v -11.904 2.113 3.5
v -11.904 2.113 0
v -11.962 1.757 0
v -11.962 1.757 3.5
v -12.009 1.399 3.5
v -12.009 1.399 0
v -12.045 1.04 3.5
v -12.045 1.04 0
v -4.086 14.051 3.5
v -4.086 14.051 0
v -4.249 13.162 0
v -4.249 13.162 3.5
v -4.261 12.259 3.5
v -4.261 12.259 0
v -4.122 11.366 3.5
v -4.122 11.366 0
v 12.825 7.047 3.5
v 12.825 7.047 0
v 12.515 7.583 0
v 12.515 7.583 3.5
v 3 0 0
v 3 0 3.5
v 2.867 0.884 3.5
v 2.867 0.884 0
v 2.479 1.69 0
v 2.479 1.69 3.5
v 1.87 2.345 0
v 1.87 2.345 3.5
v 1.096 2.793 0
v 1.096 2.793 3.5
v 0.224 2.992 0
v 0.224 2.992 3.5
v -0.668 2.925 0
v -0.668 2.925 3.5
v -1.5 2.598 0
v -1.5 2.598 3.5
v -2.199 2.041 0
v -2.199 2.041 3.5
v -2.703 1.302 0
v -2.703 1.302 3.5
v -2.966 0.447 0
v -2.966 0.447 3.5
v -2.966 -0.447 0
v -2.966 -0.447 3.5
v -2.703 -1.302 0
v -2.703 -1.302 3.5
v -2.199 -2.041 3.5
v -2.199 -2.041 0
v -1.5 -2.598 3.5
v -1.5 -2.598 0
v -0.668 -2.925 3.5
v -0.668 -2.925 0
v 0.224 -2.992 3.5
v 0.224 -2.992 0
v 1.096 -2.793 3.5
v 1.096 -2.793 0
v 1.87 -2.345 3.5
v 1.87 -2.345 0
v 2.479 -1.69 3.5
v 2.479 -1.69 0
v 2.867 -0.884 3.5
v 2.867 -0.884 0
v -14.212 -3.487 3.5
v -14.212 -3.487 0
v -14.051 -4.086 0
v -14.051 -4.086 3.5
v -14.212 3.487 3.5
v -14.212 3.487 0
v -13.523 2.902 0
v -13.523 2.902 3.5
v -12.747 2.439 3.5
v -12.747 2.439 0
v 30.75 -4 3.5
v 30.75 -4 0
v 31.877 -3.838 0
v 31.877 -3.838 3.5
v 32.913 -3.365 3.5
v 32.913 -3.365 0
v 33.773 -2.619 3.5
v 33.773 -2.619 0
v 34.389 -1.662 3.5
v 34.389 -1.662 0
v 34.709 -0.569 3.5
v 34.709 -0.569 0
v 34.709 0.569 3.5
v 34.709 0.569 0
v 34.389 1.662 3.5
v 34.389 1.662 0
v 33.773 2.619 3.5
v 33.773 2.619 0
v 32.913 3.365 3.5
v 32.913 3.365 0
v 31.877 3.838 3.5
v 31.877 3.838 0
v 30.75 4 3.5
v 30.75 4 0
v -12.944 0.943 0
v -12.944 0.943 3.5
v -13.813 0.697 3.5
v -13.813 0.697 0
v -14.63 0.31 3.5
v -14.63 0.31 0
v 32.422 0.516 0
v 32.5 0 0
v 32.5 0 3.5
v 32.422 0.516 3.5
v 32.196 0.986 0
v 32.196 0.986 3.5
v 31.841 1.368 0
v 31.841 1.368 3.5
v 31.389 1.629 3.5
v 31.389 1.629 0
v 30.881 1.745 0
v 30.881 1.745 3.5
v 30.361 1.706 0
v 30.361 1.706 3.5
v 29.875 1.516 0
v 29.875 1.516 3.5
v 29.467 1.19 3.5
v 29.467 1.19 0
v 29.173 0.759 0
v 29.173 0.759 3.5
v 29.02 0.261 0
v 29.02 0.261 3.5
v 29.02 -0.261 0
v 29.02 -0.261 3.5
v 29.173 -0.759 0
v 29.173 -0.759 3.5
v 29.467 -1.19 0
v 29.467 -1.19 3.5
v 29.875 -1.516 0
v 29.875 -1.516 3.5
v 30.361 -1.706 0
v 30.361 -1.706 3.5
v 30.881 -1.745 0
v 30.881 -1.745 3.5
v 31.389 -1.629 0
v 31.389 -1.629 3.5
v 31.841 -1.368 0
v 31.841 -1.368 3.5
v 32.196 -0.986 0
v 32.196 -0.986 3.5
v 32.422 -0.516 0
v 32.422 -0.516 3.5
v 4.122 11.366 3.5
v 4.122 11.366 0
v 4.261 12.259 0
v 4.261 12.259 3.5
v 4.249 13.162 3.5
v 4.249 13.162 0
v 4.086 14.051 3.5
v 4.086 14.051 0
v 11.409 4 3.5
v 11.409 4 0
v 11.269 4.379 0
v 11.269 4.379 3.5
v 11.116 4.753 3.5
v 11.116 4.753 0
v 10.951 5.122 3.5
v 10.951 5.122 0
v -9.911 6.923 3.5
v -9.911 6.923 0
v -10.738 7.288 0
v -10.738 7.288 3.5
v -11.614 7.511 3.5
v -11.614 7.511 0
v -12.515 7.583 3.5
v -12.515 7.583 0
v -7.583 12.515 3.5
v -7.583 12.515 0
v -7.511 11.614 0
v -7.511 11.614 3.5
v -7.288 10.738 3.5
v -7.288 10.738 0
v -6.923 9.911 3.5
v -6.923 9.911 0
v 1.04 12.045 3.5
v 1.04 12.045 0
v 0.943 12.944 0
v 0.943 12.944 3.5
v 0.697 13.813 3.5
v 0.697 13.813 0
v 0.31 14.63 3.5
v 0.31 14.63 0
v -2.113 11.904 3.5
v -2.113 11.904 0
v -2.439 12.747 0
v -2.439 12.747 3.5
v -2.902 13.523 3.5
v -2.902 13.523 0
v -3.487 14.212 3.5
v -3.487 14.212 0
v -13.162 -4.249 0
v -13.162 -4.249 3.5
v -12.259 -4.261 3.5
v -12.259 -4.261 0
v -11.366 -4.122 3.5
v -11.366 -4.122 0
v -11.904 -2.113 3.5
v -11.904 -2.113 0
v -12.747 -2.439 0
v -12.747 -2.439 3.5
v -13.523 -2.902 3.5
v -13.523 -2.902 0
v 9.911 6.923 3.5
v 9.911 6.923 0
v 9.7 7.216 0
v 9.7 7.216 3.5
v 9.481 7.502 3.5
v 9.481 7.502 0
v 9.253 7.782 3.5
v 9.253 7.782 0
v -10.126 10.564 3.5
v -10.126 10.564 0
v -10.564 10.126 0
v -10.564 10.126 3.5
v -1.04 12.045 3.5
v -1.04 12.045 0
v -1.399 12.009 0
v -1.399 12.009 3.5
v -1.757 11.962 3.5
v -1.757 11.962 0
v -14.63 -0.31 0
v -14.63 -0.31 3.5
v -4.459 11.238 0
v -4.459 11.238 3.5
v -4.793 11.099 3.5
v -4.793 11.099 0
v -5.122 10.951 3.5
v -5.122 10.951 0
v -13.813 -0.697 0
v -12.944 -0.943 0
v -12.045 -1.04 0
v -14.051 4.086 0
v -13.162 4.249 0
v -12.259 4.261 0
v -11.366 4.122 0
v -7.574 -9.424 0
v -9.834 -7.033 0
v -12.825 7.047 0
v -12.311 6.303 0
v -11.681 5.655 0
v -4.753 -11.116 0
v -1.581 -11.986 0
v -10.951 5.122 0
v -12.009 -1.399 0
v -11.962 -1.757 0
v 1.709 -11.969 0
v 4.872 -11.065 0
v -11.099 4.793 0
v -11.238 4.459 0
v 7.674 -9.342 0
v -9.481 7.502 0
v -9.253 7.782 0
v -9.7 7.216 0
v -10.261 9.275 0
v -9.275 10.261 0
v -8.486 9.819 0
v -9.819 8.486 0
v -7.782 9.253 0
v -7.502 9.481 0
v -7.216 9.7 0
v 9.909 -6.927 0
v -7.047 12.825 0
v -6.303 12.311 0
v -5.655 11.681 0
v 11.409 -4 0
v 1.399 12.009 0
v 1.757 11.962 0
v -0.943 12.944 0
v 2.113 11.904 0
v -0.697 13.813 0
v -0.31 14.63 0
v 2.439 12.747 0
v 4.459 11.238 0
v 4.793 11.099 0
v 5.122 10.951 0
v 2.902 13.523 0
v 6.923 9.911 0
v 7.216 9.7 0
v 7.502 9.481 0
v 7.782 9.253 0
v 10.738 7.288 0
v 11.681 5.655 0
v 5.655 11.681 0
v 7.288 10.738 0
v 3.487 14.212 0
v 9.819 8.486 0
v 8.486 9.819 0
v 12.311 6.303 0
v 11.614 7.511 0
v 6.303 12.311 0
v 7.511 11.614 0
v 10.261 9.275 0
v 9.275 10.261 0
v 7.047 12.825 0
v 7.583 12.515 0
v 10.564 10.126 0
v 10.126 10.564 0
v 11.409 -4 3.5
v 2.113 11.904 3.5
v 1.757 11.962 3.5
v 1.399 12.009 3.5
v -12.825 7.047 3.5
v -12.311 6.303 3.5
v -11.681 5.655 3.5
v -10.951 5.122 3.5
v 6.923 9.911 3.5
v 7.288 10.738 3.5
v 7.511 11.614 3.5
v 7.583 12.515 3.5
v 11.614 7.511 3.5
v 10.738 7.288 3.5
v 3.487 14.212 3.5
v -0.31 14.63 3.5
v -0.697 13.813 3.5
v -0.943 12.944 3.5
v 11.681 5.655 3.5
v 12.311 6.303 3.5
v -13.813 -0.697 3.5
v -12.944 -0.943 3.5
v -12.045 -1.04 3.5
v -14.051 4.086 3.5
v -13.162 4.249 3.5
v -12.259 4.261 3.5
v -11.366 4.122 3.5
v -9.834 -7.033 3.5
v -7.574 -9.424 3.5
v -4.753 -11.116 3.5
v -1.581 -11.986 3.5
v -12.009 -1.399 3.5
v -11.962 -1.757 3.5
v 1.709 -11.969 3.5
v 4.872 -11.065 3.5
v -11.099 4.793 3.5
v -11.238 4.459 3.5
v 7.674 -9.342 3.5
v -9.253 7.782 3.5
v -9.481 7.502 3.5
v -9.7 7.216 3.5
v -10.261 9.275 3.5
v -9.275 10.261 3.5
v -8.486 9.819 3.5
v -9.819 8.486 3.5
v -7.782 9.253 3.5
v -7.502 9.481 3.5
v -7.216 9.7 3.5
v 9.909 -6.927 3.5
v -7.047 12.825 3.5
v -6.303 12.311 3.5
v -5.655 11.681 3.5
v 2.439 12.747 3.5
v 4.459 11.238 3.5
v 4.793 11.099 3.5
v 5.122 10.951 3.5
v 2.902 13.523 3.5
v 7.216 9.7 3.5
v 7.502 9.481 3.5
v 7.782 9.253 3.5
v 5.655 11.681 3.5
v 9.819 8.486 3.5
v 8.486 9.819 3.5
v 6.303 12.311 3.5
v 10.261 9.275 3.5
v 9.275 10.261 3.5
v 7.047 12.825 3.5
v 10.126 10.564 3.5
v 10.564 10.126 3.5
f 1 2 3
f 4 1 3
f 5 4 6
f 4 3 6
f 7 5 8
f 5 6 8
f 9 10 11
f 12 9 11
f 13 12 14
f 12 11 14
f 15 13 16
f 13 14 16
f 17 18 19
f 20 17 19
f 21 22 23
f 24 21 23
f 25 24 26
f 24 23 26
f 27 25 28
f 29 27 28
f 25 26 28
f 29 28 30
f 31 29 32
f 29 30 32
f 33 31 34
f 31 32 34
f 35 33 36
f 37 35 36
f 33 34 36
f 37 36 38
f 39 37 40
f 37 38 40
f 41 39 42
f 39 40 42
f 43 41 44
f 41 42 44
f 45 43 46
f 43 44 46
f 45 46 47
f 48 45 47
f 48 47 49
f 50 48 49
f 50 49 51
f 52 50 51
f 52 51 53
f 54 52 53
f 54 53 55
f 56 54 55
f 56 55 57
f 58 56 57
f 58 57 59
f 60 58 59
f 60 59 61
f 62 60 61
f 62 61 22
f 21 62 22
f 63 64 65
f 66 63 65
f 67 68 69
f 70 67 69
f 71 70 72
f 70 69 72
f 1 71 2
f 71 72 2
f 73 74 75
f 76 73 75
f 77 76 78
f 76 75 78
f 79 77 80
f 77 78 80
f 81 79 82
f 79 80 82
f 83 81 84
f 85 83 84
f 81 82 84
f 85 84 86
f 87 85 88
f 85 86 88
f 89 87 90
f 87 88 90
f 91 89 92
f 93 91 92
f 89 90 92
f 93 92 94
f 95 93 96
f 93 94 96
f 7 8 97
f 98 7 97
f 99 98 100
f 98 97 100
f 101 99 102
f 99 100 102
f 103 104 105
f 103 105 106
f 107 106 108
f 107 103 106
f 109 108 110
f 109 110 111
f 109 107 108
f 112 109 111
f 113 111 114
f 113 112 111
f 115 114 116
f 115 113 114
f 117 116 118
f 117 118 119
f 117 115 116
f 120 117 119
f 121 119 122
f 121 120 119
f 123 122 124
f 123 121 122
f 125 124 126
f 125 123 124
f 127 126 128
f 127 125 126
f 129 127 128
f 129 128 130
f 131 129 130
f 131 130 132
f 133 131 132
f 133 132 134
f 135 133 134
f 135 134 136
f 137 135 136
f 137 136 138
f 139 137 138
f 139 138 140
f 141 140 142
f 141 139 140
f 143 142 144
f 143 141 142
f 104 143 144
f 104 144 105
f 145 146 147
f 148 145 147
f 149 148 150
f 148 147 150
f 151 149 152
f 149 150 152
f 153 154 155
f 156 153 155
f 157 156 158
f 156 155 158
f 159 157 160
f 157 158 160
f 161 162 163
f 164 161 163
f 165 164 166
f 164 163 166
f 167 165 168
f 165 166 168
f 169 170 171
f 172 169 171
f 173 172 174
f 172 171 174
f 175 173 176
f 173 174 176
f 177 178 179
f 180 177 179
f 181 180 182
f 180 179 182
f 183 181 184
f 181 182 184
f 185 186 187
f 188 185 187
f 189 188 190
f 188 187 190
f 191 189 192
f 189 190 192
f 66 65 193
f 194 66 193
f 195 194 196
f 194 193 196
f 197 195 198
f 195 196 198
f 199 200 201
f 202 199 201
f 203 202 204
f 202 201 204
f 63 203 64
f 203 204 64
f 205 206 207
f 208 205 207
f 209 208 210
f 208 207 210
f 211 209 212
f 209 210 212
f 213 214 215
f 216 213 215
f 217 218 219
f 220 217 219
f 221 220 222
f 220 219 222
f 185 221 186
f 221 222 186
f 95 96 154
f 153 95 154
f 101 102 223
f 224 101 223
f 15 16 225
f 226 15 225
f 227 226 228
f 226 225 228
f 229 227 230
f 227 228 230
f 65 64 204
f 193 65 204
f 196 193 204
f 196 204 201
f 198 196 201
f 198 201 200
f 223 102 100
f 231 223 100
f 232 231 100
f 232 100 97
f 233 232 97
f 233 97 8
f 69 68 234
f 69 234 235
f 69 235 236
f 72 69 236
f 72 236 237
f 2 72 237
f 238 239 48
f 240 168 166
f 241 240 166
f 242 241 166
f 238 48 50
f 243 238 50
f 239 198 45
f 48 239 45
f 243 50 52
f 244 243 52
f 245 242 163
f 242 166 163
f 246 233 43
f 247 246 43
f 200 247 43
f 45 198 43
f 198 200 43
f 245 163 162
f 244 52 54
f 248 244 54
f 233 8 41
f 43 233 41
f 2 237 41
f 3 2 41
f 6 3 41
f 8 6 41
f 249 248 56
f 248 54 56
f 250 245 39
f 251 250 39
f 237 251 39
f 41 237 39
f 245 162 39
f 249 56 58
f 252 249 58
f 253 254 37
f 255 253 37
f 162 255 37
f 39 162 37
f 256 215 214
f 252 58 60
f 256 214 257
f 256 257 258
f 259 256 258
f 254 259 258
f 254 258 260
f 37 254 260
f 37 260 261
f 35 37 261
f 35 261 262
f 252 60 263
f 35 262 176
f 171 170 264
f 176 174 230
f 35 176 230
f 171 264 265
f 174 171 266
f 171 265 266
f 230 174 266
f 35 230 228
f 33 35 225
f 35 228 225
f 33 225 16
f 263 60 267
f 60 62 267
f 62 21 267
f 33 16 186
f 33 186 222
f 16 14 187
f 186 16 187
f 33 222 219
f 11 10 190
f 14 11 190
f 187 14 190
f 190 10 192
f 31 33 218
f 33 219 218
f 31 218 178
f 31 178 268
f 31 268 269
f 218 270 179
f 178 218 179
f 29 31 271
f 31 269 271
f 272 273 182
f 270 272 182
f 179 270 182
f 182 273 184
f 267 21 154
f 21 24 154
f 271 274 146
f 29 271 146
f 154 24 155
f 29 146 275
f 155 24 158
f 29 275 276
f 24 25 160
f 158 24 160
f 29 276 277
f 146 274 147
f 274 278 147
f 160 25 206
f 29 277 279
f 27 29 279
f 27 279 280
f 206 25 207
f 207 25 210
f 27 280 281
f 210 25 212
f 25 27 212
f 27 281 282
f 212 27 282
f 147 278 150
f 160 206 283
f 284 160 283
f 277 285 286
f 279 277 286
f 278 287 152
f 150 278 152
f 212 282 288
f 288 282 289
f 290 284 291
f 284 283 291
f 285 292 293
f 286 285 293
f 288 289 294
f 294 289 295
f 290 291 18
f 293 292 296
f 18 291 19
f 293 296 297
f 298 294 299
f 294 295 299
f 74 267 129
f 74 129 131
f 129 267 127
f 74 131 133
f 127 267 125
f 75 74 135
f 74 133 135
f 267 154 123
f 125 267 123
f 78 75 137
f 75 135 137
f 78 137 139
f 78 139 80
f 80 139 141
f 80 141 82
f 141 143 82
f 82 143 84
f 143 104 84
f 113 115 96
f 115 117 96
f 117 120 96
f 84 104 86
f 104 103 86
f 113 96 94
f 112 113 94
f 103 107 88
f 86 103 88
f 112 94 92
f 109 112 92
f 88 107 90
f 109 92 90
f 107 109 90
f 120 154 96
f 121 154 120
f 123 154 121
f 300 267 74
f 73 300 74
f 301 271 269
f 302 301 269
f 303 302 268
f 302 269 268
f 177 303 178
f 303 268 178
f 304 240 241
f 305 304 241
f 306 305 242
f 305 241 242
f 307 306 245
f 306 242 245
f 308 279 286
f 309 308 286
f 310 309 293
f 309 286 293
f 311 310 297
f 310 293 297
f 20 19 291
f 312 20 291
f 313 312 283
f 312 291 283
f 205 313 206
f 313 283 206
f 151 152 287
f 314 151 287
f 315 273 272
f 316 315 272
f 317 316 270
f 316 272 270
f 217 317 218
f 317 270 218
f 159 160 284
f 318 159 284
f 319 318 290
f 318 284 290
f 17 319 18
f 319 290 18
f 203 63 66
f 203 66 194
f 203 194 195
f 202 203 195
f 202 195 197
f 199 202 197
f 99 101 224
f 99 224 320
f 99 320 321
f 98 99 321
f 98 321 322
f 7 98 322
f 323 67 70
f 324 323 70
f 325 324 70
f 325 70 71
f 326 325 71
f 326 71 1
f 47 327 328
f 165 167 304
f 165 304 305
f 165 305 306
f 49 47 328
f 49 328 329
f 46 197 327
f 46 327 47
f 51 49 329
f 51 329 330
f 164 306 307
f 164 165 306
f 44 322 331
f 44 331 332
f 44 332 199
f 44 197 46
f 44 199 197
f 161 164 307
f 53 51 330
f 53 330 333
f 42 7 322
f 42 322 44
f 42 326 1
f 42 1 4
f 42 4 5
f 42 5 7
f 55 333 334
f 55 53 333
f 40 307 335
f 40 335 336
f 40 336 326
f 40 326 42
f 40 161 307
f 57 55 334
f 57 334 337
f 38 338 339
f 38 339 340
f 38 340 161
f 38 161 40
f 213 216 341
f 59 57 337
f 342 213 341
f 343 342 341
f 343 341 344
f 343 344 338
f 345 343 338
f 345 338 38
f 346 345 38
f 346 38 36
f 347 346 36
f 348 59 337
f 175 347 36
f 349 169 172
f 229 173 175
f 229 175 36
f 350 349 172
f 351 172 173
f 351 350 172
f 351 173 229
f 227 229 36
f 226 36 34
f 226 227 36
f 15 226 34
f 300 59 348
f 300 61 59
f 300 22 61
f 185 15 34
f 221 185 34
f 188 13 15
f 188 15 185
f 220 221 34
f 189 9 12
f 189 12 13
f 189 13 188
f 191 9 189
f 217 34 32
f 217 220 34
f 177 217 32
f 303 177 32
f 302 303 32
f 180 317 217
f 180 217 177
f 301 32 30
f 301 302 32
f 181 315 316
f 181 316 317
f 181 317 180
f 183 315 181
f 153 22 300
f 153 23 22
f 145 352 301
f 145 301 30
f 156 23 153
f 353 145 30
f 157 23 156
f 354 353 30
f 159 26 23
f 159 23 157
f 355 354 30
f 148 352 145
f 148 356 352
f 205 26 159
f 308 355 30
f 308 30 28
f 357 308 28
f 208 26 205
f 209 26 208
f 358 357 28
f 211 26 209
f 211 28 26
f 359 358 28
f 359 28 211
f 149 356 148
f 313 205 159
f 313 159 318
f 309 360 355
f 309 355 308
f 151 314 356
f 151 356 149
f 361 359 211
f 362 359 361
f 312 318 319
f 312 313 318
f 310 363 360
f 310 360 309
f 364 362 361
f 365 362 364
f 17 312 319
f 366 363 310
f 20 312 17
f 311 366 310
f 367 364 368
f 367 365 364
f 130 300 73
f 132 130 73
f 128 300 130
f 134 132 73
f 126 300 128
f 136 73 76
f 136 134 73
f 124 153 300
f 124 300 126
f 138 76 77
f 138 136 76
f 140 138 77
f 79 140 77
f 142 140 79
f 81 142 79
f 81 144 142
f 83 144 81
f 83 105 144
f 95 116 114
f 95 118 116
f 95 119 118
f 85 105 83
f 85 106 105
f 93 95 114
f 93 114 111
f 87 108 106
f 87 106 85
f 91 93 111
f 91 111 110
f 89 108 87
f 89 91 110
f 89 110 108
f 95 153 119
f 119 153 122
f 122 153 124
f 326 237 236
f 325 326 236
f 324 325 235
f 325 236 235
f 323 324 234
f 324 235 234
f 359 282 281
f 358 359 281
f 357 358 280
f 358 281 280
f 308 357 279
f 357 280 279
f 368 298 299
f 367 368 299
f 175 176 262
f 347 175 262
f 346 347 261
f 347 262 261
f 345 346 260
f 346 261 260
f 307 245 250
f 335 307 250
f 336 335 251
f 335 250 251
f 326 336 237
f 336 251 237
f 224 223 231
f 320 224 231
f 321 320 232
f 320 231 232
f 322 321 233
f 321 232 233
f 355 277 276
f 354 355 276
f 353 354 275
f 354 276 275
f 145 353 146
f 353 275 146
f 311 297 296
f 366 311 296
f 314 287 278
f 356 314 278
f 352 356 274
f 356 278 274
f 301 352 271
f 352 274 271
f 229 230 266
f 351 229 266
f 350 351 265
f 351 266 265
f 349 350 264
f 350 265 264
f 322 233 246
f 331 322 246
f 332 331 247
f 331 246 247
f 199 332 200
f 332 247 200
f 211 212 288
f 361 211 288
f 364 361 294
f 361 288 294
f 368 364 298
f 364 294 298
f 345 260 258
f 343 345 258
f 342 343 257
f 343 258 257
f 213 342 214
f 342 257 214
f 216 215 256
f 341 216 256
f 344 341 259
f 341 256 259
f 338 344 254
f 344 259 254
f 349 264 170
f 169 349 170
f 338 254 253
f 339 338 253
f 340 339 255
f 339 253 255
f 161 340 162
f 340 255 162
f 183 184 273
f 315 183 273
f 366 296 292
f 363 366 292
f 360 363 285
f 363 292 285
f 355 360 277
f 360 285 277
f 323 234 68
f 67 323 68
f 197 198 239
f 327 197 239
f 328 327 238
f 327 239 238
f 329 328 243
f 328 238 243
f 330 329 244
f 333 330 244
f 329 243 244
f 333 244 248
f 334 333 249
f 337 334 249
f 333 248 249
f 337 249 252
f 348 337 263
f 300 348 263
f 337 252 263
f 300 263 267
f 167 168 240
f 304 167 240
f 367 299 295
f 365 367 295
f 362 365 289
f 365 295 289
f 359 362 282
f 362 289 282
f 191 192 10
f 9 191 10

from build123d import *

# Parameters (mm, degrees)
SKETCH1_R           = 1.75
BOSS_EXTRUDE1_DEPTH = 3.5
SKETCH2_R           = 3
CUT_EXTRUDE1_DEPTH  = 38.866203929


with BuildPart() as part:
    # Sketch1 → Boss-Extrude1 (new body)
    with BuildSketch(Plane.XY):
        with BuildLine():
            Line((0.31, 14.63), (-0.31, 14.63))
            ThreePointArc((-0.31, 14.63), (-0.838273314, 13.383704325), (-1.04, 12.04518576))
            ThreePointArc((-1.04, 12.04518576), (-1.578061664, 11.986568374), (-2.112960617, 11.903927815))
            ThreePointArc((-2.112960617, 11.903927815), (-2.65424773, 13.144626757), (-3.487085624, 14.211728743))
            Line((-3.487085624, 14.211728743), (-4.085959636, 14.051260935))
            ThreePointArc((-4.085959636, 14.051260935), (-4.273667417, 12.71070456), (-4.122086336, 11.365584201))
            ThreePointArc((-4.122086336, 11.365584201), (-4.626642697, 11.169703548), (-5.12192646, 10.951436862))
            ThreePointArc((-5.12192646, 10.951436862), (-5.965886177, 12.009764599), (-7.046532125, 12.824951657))
            Line((-7.046532125, 12.824951657), (-7.583467875, 12.514951657))
            ThreePointArc((-7.583467875, 12.514951657), (-7.417818147, 11.171491285), (-6.9232593, 9.911436862))
            ThreePointArc((-6.9232593, 9.911436862), (-7.359925677, 9.591641884), (-7.781841479, 9.252623584))
            ThreePointArc((-7.781841479, 9.252623584), (-8.870959341, 10.05645683), (-10.125769107, 10.564175311))
            Line((-10.125769107, 10.564175311), (-10.564175311, 10.125769107))
            ThreePointArc((-10.564175311, 10.125769107), (-10.05645683, 8.870959341), (-9.252623584, 7.781841479))
            ThreePointArc((-9.252623584, 7.781841479), (-9.591641884, 7.359925677), (-9.911436862, 6.9232593))
            ThreePointArc((-9.911436862, 6.9232593), (-11.171491285, 7.417818147), (-12.514951657, 7.583467875))
            Line((-12.514951657, 7.583467875), (-12.824951657, 7.046532125))
            ThreePointArc((-12.824951657, 7.046532125), (-12.009764599, 5.965886177), (-10.951436862, 5.12192646))
            ThreePointArc((-10.951436862, 5.12192646), (-11.169703548, 4.626642697), (-11.365584201, 4.122086336))
            ThreePointArc((-11.365584201, 4.122086336), (-12.71070456, 4.273667417), (-14.051260935, 4.085959636))
            Line((-14.051260935, 4.085959636), (-14.211728743, 3.487085624))
            ThreePointArc((-14.211728743, 3.487085624), (-13.144626757, 2.65424773), (-11.903927815, 2.112960617))
            ThreePointArc((-11.903927815, 2.112960617), (-11.986568374, 1.578061664), (-12.04518576, 1.04))
            ThreePointArc((-12.04518576, 1.04), (-13.383704325, 0.838273314), (-14.63, 0.31))
            Line((-14.63, 0.31), (-14.63, -0.31))
            ThreePointArc((-14.63, -0.31), (-13.383704325, -0.838273314), (-12.04518576, -1.04))
            ThreePointArc((-12.04518576, -1.04), (-11.986568374, -1.578061664), (-11.903927815, -2.112960617))
            ThreePointArc((-11.903927815, -2.112960617), (-13.144626757, -2.65424773), (-14.211728743, -3.487085624))
            Line((-14.211728743, -3.487085624), (-14.051260935, -4.085959636))
            ThreePointArc((-14.051260935, -4.085959636), (-12.71070456, -4.273667417), (-11.365584201, -4.122086336))
            ThreePointArc((-11.365584201, -4.122086336), (0.064808849, -12.089826294), (11.409123542, -4))
            Line((11.409123542, -4), (30.75, -4))
            ThreePointArc((30.75, -4), (34.75, 0), (30.75, 4))
            Line((30.75, 4), (11.409123542, 4))
            ThreePointArc((11.409123542, 4), (11.194344337, 4.566700654), (10.951436862, 5.12192646))
            ThreePointArc((10.951436862, 5.12192646), (12.009764599, 5.965886177), (12.824951657, 7.046532125))
            Line((12.824951657, 7.046532125), (12.514951657, 7.583467875))
            ThreePointArc((12.514951657, 7.583467875), (11.171491285, 7.417818147), (9.911436862, 6.9232593))
            ThreePointArc((9.911436862, 6.9232593), (9.591641884, 7.359925677), (9.252623584, 7.781841479))
            ThreePointArc((9.252623584, 7.781841479), (10.05645683, 8.870959341), (10.564175311, 10.125769107))
            Line((10.564175311, 10.125769107), (10.125769107, 10.564175311))
            ThreePointArc((10.125769107, 10.564175311), (8.870959341, 10.05645683), (7.781841479, 9.252623584))
            ThreePointArc((7.781841479, 9.252623584), (7.359925677, 9.591641884), (6.9232593, 9.911436862))
            ThreePointArc((6.9232593, 9.911436862), (7.417818147, 11.171491285), (7.583467875, 12.514951657))
            Line((7.583467875, 12.514951657), (7.046532125, 12.824951657))
            ThreePointArc((7.046532125, 12.824951657), (5.965886177, 12.009764599), (5.12192646, 10.951436862))
            ThreePointArc((5.12192646, 10.951436862), (4.626642697, 11.169703548), (4.122086336, 11.365584201))
            ThreePointArc((4.122086336, 11.365584201), (4.273667417, 12.71070456), (4.085959636, 14.051260935))
            Line((4.085959636, 14.051260935), (3.487085624, 14.211728743))
            ThreePointArc((3.487085624, 14.211728743), (2.65424773, 13.144626757), (2.112960617, 11.903927815))
            ThreePointArc((2.112960617, 11.903927815), (1.578061664, 11.986568374), (1.04, 12.04518576))
            ThreePointArc((1.04, 12.04518576), (0.838273314, 13.383704325), (0.31, 14.63))
        make_face()
        with Locations((30.75, 0)):
            Circle(SKETCH1_R, mode=Mode.SUBTRACT)
        Circle(SKETCH1_R, mode=Mode.SUBTRACT)
    extrude(amount=BOSS_EXTRUDE1_DEPTH)

    # Sketch2 → Cut-Extrude1 (cut, through all)
    with BuildSketch(Plane.XY.offset(3.5)):
        Circle(SKETCH2_R)
    extrude(amount=-CUT_EXTRUDE1_DEPTH, mode=Mode.SUBTRACT)


solid = part.part
